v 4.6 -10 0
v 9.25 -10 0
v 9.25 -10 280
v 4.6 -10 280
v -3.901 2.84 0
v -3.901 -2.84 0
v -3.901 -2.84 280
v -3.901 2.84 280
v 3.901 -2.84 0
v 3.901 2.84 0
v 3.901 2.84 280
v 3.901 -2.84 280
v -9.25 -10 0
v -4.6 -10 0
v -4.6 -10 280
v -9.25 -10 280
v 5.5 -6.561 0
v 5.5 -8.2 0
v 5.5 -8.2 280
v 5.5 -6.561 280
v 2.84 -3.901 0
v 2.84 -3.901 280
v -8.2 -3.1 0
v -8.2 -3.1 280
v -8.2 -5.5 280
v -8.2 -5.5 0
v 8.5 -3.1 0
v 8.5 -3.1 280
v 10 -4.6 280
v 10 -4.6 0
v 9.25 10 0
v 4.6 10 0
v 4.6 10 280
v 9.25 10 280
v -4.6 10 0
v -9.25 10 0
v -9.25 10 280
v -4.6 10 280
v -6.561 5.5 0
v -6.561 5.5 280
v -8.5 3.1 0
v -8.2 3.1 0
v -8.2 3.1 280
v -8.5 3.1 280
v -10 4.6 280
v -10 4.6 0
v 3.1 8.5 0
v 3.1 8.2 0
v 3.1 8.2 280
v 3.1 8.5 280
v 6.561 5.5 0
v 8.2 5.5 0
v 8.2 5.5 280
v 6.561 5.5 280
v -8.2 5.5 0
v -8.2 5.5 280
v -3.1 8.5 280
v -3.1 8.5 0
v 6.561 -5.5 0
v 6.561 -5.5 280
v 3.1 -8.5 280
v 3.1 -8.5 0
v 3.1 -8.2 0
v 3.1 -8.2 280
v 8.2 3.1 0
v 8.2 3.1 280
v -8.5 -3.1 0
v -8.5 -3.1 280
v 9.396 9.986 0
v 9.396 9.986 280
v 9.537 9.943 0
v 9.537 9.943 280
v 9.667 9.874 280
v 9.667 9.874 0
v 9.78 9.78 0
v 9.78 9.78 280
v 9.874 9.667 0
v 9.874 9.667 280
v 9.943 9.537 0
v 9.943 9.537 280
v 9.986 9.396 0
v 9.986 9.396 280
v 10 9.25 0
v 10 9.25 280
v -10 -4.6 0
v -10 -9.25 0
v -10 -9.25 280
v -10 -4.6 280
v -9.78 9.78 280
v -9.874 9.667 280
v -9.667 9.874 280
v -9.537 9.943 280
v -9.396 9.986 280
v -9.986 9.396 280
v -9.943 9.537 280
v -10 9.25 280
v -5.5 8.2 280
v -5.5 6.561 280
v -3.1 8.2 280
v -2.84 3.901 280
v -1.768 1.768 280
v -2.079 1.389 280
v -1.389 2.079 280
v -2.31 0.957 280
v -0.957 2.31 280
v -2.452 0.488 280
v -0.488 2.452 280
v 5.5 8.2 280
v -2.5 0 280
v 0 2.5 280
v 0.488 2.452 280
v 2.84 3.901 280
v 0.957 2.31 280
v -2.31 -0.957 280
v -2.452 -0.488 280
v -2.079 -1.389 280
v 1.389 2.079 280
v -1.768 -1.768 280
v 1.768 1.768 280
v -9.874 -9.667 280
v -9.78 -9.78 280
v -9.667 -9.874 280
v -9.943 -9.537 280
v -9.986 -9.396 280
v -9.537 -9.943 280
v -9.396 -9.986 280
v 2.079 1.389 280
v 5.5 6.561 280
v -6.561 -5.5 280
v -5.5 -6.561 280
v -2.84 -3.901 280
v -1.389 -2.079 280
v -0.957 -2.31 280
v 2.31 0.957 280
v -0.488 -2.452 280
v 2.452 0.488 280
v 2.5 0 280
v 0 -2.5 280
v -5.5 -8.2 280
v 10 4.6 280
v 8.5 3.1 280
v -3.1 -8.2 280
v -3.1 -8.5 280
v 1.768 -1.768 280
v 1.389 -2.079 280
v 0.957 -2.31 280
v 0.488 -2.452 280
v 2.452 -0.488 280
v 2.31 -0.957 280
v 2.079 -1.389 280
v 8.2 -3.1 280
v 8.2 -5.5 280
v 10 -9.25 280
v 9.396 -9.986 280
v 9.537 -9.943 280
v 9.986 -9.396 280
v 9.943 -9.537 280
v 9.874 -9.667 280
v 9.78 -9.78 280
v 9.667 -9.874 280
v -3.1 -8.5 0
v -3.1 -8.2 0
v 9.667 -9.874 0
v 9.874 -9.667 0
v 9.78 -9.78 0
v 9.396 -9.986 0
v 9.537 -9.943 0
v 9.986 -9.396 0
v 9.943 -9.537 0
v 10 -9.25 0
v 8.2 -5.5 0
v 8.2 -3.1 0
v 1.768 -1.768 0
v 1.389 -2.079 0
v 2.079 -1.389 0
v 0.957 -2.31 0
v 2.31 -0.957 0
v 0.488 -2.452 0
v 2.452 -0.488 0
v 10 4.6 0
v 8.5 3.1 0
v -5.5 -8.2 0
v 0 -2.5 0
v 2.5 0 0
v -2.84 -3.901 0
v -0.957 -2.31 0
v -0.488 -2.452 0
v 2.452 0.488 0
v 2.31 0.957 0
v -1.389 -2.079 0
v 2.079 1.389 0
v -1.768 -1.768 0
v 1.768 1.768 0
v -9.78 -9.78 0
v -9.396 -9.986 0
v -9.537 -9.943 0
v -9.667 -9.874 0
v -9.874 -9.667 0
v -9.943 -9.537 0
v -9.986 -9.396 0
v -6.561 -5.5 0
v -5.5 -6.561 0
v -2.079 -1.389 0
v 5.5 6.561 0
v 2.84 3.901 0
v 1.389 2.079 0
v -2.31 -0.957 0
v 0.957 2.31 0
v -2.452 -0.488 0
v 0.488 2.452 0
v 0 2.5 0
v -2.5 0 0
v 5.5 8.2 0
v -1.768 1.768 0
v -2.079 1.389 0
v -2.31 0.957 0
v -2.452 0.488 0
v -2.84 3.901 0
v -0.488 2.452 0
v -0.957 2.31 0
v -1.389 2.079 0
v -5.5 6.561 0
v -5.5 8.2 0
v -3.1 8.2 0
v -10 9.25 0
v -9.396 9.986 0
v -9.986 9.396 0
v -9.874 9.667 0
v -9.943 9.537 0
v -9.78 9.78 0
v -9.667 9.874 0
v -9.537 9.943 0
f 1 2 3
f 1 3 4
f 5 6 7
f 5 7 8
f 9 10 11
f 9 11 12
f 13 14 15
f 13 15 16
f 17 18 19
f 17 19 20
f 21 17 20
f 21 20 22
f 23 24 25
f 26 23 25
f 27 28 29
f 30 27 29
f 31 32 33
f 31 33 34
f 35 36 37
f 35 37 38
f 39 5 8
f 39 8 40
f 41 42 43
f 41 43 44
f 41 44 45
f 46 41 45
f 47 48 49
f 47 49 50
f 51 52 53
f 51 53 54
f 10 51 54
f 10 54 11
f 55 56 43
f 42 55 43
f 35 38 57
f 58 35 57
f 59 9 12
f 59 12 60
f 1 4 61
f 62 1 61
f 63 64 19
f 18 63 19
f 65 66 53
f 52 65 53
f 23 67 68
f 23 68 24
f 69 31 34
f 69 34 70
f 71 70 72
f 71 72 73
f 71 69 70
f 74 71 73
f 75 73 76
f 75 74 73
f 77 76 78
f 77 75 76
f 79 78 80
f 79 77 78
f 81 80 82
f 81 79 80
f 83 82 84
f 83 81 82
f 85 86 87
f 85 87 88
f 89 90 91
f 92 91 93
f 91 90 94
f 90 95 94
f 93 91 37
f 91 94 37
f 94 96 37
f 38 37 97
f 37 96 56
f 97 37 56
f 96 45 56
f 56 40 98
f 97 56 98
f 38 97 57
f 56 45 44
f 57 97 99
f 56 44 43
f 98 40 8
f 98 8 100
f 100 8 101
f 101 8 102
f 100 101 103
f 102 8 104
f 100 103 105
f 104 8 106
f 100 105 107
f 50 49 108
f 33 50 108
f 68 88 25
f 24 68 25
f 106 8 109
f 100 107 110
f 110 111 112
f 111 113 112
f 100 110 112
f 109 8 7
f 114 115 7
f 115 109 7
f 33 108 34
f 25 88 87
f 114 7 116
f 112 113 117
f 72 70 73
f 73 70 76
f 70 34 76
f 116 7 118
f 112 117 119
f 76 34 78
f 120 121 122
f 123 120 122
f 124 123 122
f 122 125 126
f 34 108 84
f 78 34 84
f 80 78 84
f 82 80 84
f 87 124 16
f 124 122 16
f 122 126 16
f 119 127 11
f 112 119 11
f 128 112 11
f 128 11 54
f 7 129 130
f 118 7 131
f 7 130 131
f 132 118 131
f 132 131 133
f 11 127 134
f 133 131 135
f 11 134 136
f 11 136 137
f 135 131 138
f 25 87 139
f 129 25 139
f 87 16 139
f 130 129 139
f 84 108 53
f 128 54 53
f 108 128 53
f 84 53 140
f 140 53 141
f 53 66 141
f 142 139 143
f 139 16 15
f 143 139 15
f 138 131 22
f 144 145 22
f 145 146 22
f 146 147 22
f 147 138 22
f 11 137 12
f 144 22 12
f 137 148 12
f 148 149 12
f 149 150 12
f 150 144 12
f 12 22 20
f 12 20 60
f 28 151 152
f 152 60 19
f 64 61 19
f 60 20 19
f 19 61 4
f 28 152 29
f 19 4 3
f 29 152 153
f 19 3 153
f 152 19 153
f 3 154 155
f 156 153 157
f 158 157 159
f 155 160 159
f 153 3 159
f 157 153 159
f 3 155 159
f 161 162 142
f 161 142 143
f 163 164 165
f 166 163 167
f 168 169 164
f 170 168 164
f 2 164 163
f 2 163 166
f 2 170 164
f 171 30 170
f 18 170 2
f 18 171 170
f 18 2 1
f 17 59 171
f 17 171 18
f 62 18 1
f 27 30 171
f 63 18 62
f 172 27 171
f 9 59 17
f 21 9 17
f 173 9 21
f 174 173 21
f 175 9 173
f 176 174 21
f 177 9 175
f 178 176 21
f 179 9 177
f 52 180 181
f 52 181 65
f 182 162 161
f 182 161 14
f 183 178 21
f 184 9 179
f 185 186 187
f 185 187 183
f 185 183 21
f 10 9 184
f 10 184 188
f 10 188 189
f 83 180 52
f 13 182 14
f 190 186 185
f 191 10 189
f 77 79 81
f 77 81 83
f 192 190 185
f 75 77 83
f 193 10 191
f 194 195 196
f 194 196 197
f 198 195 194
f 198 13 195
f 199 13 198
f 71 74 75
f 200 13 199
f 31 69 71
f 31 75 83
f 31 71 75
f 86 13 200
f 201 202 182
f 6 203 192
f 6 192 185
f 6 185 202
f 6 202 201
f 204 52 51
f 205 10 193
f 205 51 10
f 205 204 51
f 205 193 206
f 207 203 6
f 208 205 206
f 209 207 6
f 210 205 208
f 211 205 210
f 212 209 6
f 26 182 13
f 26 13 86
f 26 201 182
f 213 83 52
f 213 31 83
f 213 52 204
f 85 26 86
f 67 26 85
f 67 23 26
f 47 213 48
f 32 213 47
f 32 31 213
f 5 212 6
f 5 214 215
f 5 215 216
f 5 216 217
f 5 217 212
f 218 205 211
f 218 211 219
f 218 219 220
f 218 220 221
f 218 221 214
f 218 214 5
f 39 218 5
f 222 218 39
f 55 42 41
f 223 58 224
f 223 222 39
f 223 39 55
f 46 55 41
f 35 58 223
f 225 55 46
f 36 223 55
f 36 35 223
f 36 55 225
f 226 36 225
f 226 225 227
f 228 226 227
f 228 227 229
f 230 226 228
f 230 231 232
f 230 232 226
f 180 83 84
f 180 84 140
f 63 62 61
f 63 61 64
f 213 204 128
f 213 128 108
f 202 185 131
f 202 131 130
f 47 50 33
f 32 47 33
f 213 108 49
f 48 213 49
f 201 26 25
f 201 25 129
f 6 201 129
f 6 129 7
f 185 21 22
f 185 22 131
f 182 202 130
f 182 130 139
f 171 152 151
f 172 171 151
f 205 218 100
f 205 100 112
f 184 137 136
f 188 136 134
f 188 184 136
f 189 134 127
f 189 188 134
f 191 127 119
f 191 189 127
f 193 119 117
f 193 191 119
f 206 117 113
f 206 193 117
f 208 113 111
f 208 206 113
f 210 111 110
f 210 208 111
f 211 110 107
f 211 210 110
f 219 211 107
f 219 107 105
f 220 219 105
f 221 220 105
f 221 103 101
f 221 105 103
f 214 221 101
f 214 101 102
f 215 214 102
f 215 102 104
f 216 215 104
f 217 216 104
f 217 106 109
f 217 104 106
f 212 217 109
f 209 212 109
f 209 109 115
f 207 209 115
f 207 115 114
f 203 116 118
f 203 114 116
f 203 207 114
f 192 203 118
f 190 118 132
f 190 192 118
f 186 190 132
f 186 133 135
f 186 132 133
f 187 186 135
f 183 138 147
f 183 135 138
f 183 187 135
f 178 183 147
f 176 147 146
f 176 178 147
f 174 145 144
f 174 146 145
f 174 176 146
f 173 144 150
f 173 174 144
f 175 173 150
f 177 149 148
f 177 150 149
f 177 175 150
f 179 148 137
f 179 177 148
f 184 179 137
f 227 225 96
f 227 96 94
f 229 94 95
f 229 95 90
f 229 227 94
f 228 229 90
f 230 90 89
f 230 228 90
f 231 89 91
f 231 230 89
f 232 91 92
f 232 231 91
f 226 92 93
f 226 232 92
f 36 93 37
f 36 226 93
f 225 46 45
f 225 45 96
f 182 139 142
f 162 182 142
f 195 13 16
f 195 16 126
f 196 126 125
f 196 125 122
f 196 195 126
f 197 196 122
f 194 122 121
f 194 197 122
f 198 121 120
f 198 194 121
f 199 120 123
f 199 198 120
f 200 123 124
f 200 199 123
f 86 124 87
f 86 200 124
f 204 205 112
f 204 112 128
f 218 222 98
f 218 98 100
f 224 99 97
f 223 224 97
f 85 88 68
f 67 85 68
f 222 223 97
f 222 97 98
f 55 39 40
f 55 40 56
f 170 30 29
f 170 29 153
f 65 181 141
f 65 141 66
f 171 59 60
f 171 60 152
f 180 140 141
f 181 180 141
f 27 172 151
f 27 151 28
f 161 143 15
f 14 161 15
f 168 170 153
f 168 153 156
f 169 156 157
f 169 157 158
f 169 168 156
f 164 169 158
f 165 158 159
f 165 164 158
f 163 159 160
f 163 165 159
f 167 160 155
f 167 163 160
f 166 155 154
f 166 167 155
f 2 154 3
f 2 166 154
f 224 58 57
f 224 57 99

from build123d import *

# Parameters (mm, degrees)
CROQUIS1_R              = 2.5
SALIENTE_EXTRUIR1_DEPTH = 326
SKETCH2_W               = 139.582587955
SKETCH2_H               = 242.432915921
CUT_EXTRUDE1_DEPTH      = 47
CUT_EXTRUDE1_DEPTH_BACK = 30


with BuildPart() as part:
    # Croquis1 → Saliente-Extruir1 (new body)
    with BuildSketch(Plane.XY):
        with BuildLine():
            Line((-4.6, 10), (-3.1, 8.5))
            Line((-3.1, 8.5), (-3.1, 8.2))
            Line((-3.1, 8.2), (-5.5, 8.2))
            Line((-5.5, 8.2), (-5.5, 6.560660172))
            Line((-5.5, 6.560660172), (-2.84, 3.900660172))
            Line((-2.84, 3.900660172), (0, 3.900660172))
            Line((0, 3.900660172), (2.84, 3.900660172))
            Line((2.84, 3.900660172), (5.5, 6.560660172))
            Line((5.5, 6.560660172), (5.5, 8.2))
            Line((5.5, 8.2), (3.1, 8.2))
            Line((3.1, 8.2), (3.1, 8.5))
            Line((3.1, 8.5), (4.6, 10))
            Line((4.6, 10), (9.25, 10))
            ThreePointArc((9.25, 10), (9.780330086, 9.780330086), (10, 9.25))
            Line((10, 9.25), (10, 4.6))
            Line((10, 4.6), (8.5, 3.1))
            Line((8.5, 3.1), (8.2, 3.1))
            Line((8.2, 3.1), (8.2, 5.5))
            Line((8.2, 5.5), (6.560660172, 5.5))
            Line((6.560660172, 5.5), (3.900660172, 2.84))
            Line((3.900660172, 2.84), (3.900660172, 0))
            Line((3.900660172, 0), (3.900660172, -2.84))
            Line((3.900660172, -2.84), (6.560660172, -5.5))
            Line((6.560660172, -5.5), (8.2, -5.5))
            Line((8.2, -5.5), (8.2, -3.1))
            Line((8.2, -3.1), (8.5, -3.1))
            Line((8.5, -3.1), (10, -4.6))
            Line((10, -4.6), (10, -9.25))
            ThreePointArc((10, -9.25), (9.780330086, -9.780330086), (9.25, -10))
            Line((9.25, -10), (4.6, -10))
            Line((4.6, -10), (3.1, -8.5))
            Line((3.1, -8.5), (3.1, -8.2))
            Line((3.1, -8.2), (5.5, -8.2))
            Line((5.5, -8.2), (5.5, -6.560660172))
            Line((5.5, -6.560660172), (2.84, -3.900660172))
            Line((2.84, -3.900660172), (0, -3.900660172))
            Line((0, -3.900660172), (-2.84, -3.900660172))
            Line((-2.84, -3.900660172), (-5.5, -6.560660172))
            Line((-5.5, -6.560660172), (-5.5, -8.2))
            Line((-5.5, -8.2), (-3.1, -8.2))
            Line((-3.1, -8.2), (-3.1, -8.5))
            Line((-3.1, -8.5), (-4.6, -10))
            Line((-4.6, -10), (-9.25, -10))
            ThreePointArc((-9.25, -10), (-9.780330086, -9.780330086), (-10, -9.25))
            Line((-10, -9.25), (-10, -4.6))
            Line((-10, -4.6), (-8.5, -3.1))
            Line((-8.5, -3.1), (-8.2, -3.1))
            Line((-8.2, -3.1), (-8.2, -5.5))
            Line((-8.2, -5.5), (-6.560660172, -5.5))
            Line((-6.560660172, -5.5), (-3.900660172, -2.84))
            Line((-3.900660172, -2.84), (-3.900660172, 0))
            Line((-3.900660172, 0), (-3.900660172, 2.84))
            Line((-3.900660172, 2.84), (-6.560660172, 5.5))
            Line((-6.560660172, 5.5), (-8.2, 5.5))
            Line((-8.2, 5.5), (-8.2, 3.1))
            Line((-8.2, 3.1), (-8.5, 3.1))
            Line((-8.5, 3.1), (-10, 4.6))
            Line((-10, 4.6), (-10, 9.25))
            ThreePointArc((-10, 9.25), (-9.780330086, 9.780330086), (-9.25, 10))
            Line((-9.25, 10), (-4.6, 10))
        make_face()
        Circle(CROQUIS1_R, mode=Mode.SUBTRACT)
    extrude(amount=SALIENTE_EXTRUIR1_DEPTH)

    # Sketch2 → Cut-Extrude1 (cut, two sides)
    with BuildSketch(Plane(origin=(0, 0, 0), x_dir=(1, 0, 0), z_dir=(0, 1, 0))) as cut_extrude1_sk:
        with Locations((12.355396541, -401.216457961)):
            Rectangle(SKETCH2_W, SKETCH2_H)
    extrude(amount=CUT_EXTRUDE1_DEPTH, mode=Mode.SUBTRACT)
    extrude(cut_extrude1_sk.sketch, amount=-CUT_EXTRUDE1_DEPTH_BACK, mode=Mode.SUBTRACT)


solid = part.part
